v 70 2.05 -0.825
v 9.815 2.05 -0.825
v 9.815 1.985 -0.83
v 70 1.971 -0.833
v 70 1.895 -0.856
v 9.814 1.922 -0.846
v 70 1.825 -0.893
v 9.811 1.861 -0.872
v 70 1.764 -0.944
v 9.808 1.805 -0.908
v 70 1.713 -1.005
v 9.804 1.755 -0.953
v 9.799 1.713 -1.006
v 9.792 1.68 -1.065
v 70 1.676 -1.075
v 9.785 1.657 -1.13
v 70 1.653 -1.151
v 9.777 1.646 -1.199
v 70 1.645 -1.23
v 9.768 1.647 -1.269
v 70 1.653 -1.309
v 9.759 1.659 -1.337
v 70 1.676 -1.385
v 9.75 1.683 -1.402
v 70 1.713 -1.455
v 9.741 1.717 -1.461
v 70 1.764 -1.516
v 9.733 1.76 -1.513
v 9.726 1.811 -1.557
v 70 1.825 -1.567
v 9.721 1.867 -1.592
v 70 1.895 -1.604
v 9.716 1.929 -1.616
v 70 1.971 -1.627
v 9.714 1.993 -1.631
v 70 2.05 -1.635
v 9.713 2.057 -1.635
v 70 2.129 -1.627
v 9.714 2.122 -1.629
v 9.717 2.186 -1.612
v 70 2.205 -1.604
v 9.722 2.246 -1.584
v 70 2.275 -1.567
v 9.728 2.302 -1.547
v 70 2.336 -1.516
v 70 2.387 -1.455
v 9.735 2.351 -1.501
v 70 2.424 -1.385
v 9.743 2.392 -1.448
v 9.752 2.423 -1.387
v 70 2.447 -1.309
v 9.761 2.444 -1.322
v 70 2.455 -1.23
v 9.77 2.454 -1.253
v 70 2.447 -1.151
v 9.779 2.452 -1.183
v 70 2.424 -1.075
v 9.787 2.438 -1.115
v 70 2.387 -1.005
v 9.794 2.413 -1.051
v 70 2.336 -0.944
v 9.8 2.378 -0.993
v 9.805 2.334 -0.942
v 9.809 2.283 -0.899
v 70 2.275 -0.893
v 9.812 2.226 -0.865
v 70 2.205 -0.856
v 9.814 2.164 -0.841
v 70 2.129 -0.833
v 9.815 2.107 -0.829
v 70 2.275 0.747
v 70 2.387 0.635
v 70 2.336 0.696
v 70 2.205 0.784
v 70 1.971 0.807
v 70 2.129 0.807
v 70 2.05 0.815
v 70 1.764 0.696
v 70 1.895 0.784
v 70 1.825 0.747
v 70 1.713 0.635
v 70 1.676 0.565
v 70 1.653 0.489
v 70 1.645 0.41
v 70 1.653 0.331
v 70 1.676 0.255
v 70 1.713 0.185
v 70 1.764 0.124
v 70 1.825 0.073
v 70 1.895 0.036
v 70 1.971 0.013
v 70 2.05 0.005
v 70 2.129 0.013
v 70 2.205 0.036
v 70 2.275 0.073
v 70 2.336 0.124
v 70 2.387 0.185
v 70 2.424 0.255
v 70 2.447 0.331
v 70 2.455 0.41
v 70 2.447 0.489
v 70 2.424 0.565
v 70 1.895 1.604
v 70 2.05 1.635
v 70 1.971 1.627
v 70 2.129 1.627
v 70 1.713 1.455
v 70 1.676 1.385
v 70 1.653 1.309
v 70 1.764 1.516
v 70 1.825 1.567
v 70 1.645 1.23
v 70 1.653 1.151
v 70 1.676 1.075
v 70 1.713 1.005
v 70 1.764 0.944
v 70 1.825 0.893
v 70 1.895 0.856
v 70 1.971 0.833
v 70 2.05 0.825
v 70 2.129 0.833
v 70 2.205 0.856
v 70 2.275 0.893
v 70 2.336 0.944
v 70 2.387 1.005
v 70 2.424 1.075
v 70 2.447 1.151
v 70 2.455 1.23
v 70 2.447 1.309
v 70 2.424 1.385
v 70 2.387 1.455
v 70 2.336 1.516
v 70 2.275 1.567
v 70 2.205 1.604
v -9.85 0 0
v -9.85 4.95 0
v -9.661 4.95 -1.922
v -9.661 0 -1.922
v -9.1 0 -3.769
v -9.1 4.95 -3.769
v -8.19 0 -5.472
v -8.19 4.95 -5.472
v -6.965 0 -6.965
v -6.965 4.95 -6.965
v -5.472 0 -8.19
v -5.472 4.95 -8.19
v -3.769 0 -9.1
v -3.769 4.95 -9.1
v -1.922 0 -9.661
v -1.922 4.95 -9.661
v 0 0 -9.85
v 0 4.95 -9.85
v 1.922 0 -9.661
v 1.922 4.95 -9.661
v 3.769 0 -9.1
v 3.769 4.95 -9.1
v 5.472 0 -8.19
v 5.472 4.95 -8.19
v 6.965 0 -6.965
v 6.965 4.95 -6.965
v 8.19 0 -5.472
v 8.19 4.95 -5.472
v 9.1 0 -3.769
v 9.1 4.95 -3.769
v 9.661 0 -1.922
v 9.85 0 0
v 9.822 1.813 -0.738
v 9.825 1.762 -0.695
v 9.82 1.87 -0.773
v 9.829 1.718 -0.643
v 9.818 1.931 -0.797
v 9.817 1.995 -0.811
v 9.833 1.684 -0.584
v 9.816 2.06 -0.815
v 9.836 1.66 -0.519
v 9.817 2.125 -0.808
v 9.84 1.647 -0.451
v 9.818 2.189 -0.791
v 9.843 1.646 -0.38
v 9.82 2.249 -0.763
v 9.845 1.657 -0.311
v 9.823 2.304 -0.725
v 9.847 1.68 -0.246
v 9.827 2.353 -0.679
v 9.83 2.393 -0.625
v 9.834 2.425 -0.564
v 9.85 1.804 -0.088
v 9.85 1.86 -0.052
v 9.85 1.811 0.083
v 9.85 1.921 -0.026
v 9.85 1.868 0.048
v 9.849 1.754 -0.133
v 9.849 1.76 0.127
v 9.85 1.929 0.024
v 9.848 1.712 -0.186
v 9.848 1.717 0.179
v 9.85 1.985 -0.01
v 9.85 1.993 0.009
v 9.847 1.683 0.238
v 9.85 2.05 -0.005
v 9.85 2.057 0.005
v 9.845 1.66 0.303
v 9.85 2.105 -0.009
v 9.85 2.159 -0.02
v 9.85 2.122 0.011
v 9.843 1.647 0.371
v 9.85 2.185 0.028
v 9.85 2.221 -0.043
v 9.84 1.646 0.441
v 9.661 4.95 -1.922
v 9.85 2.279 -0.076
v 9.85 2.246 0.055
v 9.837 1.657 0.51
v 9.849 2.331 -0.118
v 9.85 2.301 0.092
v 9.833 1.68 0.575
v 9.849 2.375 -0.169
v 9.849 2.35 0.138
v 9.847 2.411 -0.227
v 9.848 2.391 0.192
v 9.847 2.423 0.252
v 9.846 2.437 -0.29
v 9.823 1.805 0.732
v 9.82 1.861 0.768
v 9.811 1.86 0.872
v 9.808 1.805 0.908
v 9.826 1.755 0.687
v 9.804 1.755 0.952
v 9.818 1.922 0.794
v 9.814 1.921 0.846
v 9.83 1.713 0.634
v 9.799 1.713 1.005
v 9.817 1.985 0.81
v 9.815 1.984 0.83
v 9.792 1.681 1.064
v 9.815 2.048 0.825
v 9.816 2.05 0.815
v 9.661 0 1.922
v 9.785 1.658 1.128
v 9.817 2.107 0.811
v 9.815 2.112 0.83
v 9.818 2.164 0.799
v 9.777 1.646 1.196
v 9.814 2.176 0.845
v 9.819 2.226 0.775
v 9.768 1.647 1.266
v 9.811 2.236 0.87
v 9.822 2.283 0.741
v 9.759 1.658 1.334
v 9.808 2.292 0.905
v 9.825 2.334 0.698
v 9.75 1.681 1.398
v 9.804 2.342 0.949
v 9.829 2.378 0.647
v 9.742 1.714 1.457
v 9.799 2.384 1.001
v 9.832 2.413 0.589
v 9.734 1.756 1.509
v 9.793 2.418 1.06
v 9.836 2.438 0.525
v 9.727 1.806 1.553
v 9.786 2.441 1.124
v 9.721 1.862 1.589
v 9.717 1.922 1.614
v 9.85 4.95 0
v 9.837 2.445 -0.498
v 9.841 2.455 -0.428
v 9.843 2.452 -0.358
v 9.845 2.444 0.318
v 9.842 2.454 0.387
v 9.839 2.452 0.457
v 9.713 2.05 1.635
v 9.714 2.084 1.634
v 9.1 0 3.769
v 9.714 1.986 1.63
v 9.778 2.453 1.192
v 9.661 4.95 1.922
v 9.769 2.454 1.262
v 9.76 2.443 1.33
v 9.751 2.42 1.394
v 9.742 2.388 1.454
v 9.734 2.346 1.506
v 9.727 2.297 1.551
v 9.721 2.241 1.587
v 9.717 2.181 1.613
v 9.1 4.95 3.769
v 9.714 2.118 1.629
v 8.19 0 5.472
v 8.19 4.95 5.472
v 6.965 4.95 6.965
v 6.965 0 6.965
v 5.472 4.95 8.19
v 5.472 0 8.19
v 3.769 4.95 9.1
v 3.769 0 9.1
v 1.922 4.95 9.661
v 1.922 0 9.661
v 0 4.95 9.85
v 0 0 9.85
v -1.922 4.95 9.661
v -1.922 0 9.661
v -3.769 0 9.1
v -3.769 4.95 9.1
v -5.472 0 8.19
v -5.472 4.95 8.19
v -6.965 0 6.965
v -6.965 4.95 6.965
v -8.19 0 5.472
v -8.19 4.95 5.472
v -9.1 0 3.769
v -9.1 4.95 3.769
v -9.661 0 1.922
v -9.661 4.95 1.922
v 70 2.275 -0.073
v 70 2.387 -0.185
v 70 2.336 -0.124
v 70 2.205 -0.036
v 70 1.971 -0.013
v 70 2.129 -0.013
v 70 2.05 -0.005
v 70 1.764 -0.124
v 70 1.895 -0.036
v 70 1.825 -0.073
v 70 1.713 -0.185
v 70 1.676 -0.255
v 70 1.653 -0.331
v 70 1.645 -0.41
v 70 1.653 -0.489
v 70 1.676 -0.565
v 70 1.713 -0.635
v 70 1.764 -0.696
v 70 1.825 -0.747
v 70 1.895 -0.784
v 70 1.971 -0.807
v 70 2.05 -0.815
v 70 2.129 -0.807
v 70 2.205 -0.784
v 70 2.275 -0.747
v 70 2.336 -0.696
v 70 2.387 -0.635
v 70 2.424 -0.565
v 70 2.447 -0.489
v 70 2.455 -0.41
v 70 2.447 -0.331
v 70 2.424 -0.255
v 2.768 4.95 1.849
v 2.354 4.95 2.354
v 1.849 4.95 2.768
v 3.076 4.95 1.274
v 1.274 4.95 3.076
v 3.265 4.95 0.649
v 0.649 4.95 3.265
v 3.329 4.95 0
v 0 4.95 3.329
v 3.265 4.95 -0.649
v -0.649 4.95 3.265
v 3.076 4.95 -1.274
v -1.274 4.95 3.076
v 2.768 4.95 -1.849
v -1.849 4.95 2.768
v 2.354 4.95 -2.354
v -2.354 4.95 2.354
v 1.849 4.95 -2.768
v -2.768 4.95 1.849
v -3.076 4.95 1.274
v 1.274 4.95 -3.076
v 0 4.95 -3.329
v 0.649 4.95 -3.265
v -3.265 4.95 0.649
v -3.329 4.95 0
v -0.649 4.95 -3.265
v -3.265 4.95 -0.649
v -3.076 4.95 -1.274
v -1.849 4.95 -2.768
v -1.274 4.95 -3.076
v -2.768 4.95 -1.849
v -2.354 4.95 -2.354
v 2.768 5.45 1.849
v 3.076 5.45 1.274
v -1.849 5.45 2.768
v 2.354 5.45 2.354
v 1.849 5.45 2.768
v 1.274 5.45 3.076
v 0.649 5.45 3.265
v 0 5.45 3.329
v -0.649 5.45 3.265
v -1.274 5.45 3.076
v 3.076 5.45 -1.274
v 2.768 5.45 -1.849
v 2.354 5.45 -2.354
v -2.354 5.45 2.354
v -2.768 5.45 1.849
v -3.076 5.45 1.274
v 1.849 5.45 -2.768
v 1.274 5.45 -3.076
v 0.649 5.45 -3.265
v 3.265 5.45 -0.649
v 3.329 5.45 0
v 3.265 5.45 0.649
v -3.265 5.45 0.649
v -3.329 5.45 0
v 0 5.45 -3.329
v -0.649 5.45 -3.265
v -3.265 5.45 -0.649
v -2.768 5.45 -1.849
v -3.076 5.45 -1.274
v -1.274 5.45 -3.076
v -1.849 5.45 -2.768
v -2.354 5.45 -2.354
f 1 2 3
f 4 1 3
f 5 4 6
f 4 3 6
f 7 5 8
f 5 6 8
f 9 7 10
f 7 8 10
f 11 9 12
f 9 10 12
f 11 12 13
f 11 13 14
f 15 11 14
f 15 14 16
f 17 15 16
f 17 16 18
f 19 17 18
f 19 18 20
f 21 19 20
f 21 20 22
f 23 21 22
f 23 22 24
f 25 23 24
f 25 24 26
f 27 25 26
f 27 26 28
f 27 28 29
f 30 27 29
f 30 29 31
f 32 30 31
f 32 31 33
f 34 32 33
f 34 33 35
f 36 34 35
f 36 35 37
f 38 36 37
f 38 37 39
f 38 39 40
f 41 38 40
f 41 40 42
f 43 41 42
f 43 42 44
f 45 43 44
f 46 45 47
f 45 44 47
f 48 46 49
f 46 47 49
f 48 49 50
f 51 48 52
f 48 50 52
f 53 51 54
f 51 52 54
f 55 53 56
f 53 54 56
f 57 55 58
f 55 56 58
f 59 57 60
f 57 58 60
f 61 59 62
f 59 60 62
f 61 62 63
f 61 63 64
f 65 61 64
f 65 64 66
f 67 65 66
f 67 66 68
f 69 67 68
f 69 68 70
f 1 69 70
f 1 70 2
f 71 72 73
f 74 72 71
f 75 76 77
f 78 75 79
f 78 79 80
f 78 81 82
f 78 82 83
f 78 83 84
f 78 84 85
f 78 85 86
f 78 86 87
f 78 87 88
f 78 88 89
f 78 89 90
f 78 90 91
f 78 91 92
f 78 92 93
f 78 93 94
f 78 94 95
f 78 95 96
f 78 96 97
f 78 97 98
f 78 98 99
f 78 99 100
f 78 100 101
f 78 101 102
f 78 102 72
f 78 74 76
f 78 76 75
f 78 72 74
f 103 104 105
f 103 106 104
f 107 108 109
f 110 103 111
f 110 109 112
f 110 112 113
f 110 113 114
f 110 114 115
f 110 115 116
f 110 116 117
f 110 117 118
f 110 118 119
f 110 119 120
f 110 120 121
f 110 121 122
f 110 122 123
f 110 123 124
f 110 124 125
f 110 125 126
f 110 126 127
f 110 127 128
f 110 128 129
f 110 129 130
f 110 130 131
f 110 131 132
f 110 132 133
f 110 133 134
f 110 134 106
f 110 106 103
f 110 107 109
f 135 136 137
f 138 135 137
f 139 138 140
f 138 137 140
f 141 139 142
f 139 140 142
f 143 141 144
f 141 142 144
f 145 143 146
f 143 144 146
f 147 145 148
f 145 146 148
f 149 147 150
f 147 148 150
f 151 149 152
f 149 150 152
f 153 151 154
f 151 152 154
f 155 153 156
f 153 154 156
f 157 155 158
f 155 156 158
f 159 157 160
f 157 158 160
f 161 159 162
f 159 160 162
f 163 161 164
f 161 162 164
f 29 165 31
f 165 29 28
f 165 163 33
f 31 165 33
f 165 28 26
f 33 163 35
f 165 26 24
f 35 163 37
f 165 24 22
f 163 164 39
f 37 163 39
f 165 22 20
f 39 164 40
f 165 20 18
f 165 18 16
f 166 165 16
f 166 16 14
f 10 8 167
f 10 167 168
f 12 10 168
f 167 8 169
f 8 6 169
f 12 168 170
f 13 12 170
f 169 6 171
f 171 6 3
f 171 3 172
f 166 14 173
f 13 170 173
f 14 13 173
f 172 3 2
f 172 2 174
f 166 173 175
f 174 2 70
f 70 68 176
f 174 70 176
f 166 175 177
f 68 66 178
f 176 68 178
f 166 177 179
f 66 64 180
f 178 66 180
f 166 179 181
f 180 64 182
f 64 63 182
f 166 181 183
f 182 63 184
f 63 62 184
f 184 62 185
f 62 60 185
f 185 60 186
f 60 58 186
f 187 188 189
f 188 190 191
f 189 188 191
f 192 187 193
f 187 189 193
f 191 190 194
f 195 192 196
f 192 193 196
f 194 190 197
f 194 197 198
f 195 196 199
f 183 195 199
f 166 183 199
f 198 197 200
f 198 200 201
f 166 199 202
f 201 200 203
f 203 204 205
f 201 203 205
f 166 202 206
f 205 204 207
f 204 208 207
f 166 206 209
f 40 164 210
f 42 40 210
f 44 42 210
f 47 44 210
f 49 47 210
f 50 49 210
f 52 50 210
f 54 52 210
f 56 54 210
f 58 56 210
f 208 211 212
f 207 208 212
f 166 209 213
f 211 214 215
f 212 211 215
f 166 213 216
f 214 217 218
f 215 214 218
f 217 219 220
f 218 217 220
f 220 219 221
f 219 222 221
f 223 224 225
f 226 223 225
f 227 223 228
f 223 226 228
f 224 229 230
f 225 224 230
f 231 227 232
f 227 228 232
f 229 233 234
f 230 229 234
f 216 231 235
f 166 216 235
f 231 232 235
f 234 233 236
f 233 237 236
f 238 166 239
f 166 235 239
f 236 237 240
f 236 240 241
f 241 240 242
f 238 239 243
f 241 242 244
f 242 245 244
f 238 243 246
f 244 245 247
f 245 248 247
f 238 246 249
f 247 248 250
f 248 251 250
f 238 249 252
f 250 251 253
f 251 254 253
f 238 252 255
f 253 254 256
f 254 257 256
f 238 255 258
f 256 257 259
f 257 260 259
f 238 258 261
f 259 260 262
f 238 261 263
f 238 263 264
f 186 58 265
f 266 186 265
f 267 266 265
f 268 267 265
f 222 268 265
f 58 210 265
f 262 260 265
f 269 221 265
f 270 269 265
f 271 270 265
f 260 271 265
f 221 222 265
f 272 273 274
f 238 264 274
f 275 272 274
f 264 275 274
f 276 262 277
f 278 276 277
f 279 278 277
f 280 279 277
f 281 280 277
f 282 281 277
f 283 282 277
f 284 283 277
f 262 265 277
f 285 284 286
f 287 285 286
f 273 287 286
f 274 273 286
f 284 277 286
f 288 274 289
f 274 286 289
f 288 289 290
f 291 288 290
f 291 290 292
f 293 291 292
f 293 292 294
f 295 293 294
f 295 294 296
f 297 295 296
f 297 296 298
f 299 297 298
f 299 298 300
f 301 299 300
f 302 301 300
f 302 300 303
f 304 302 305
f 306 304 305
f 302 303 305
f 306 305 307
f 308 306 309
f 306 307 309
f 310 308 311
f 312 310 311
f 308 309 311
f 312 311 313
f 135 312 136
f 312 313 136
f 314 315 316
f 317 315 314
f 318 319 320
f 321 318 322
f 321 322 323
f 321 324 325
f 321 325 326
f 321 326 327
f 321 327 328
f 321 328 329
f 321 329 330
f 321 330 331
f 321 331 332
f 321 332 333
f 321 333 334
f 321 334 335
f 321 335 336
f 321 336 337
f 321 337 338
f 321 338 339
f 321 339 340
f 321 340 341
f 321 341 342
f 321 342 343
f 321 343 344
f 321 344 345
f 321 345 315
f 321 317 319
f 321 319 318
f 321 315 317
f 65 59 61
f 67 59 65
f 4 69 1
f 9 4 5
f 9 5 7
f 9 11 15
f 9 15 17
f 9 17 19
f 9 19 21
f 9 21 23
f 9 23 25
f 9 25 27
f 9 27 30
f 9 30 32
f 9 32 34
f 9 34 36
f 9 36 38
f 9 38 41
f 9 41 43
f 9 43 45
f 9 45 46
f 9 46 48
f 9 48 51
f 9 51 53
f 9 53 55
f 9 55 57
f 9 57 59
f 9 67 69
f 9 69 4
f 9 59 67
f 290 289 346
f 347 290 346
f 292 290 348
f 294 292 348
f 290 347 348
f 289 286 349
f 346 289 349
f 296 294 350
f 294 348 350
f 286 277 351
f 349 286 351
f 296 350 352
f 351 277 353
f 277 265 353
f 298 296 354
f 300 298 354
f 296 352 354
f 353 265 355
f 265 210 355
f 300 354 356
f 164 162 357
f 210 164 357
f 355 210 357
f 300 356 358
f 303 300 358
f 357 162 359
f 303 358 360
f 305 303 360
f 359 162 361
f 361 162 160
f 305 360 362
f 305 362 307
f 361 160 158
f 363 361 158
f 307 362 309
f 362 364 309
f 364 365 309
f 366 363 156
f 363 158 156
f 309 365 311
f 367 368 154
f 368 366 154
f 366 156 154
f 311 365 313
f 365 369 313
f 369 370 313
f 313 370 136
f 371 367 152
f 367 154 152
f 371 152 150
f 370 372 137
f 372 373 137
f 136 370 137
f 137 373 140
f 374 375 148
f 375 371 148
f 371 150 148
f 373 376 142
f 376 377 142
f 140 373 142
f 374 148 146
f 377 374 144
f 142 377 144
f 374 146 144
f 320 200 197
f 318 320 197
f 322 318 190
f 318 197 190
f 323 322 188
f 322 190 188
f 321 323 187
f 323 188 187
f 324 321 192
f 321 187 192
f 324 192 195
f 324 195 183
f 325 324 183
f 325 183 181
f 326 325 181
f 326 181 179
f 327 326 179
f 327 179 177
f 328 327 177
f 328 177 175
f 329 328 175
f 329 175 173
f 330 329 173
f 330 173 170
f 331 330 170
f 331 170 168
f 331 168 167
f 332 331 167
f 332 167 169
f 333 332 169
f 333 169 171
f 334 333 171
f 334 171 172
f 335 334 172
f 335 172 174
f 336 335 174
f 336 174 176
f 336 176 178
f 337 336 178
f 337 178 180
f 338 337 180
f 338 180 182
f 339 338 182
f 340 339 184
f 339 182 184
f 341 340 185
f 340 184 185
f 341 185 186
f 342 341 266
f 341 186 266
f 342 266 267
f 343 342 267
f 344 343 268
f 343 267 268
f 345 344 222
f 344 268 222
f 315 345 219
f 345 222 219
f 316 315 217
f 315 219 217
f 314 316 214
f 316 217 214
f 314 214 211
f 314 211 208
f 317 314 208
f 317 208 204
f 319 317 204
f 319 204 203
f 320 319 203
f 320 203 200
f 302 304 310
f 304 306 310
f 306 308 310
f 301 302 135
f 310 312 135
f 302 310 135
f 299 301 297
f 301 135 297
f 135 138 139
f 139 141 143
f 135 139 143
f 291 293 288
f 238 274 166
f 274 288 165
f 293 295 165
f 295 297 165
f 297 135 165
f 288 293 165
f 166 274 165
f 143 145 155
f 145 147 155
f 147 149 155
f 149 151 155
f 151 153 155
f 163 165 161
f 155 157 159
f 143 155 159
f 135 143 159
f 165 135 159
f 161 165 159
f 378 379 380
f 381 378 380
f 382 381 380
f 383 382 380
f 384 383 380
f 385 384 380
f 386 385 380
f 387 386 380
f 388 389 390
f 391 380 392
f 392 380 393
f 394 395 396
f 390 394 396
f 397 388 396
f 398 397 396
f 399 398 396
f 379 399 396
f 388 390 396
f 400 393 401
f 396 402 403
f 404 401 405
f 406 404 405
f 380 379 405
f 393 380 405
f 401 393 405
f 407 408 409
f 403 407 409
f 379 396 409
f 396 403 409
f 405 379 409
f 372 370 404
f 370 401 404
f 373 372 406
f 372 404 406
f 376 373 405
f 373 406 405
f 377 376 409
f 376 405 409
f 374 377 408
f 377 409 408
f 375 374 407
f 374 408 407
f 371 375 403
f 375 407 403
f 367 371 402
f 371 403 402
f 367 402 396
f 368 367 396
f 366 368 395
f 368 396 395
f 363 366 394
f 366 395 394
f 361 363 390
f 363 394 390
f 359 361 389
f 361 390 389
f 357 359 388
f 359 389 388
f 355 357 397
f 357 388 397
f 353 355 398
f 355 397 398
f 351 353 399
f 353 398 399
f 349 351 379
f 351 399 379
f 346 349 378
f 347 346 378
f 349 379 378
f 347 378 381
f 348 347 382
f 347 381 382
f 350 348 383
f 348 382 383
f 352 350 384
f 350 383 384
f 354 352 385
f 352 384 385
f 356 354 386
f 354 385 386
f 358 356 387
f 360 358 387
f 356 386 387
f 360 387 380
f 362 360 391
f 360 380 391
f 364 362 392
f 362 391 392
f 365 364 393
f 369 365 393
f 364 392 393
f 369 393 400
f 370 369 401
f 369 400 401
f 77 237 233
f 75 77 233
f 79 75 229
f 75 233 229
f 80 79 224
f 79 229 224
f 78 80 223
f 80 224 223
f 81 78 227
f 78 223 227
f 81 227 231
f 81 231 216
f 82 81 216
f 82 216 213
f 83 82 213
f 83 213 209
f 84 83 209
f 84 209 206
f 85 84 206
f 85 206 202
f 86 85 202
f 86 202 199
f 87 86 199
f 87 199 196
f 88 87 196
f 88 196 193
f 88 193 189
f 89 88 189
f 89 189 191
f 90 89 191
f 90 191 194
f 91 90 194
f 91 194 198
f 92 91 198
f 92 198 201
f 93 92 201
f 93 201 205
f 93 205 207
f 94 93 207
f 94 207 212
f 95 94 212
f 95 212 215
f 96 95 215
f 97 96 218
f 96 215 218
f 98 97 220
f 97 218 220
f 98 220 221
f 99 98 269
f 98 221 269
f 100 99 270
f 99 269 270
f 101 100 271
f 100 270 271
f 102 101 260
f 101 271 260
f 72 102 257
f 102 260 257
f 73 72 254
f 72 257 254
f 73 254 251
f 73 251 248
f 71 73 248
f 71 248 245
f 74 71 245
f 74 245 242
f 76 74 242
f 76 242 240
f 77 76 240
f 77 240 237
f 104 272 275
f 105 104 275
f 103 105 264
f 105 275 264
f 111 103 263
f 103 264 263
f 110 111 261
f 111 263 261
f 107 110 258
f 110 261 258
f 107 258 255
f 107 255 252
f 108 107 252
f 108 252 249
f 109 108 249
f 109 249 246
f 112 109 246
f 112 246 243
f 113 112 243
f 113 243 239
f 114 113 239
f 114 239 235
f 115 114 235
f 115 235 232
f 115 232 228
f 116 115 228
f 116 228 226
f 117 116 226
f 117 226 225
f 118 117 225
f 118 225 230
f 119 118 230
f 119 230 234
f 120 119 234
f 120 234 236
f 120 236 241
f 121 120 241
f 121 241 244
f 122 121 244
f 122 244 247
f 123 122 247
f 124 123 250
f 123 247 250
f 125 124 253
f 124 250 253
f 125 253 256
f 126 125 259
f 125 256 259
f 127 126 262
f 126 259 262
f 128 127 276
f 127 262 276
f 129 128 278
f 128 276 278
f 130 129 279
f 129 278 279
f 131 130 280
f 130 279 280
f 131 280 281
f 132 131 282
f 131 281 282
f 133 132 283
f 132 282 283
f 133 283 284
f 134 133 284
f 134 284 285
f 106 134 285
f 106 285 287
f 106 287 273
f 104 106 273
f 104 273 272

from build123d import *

# Parameters (mm, degrees)
SKETCH3_R           = 0.405
BOSS_EXTRUDE2_DEPTH = 70


with BuildPart() as part:
    # Sketch2 → Revolve1 (revolve)
    with BuildSketch(Plane.XY):
        Polygon((0, 0), (-9.85, 0), (-9.85, 4.95), (-3.328991597, 4.95), (-3.328991597, 5.45), (0, 5.45), align=None)
    revolve(axis=Axis((0, 5.45, 0), (0, -1, 0)))

    # Sketch3 → Boss-Extrude2 (add)
    with BuildSketch(Plane(origin=(0, 0, 0), x_dir=(0, 0, -1), z_dir=(1, 0, 0))):
        with Locations(Location((-0.41, 2.05, 0), (0, 0, 180))):
            Circle(SKETCH3_R)
        with Locations(Location((-1.23, 2.05, 0), (0, 0, 180))):
            Circle(SKETCH3_R)
        with Locations(Location((1.23, 2.05, 0), (0, 0, 180))):
            Circle(SKETCH3_R)
        with Locations(Location((0.41, 2.05, 0), (0, 0, 180))):
            Circle(SKETCH3_R)
    extrude(amount=BOSS_EXTRUDE2_DEPTH)


solid = part.part
